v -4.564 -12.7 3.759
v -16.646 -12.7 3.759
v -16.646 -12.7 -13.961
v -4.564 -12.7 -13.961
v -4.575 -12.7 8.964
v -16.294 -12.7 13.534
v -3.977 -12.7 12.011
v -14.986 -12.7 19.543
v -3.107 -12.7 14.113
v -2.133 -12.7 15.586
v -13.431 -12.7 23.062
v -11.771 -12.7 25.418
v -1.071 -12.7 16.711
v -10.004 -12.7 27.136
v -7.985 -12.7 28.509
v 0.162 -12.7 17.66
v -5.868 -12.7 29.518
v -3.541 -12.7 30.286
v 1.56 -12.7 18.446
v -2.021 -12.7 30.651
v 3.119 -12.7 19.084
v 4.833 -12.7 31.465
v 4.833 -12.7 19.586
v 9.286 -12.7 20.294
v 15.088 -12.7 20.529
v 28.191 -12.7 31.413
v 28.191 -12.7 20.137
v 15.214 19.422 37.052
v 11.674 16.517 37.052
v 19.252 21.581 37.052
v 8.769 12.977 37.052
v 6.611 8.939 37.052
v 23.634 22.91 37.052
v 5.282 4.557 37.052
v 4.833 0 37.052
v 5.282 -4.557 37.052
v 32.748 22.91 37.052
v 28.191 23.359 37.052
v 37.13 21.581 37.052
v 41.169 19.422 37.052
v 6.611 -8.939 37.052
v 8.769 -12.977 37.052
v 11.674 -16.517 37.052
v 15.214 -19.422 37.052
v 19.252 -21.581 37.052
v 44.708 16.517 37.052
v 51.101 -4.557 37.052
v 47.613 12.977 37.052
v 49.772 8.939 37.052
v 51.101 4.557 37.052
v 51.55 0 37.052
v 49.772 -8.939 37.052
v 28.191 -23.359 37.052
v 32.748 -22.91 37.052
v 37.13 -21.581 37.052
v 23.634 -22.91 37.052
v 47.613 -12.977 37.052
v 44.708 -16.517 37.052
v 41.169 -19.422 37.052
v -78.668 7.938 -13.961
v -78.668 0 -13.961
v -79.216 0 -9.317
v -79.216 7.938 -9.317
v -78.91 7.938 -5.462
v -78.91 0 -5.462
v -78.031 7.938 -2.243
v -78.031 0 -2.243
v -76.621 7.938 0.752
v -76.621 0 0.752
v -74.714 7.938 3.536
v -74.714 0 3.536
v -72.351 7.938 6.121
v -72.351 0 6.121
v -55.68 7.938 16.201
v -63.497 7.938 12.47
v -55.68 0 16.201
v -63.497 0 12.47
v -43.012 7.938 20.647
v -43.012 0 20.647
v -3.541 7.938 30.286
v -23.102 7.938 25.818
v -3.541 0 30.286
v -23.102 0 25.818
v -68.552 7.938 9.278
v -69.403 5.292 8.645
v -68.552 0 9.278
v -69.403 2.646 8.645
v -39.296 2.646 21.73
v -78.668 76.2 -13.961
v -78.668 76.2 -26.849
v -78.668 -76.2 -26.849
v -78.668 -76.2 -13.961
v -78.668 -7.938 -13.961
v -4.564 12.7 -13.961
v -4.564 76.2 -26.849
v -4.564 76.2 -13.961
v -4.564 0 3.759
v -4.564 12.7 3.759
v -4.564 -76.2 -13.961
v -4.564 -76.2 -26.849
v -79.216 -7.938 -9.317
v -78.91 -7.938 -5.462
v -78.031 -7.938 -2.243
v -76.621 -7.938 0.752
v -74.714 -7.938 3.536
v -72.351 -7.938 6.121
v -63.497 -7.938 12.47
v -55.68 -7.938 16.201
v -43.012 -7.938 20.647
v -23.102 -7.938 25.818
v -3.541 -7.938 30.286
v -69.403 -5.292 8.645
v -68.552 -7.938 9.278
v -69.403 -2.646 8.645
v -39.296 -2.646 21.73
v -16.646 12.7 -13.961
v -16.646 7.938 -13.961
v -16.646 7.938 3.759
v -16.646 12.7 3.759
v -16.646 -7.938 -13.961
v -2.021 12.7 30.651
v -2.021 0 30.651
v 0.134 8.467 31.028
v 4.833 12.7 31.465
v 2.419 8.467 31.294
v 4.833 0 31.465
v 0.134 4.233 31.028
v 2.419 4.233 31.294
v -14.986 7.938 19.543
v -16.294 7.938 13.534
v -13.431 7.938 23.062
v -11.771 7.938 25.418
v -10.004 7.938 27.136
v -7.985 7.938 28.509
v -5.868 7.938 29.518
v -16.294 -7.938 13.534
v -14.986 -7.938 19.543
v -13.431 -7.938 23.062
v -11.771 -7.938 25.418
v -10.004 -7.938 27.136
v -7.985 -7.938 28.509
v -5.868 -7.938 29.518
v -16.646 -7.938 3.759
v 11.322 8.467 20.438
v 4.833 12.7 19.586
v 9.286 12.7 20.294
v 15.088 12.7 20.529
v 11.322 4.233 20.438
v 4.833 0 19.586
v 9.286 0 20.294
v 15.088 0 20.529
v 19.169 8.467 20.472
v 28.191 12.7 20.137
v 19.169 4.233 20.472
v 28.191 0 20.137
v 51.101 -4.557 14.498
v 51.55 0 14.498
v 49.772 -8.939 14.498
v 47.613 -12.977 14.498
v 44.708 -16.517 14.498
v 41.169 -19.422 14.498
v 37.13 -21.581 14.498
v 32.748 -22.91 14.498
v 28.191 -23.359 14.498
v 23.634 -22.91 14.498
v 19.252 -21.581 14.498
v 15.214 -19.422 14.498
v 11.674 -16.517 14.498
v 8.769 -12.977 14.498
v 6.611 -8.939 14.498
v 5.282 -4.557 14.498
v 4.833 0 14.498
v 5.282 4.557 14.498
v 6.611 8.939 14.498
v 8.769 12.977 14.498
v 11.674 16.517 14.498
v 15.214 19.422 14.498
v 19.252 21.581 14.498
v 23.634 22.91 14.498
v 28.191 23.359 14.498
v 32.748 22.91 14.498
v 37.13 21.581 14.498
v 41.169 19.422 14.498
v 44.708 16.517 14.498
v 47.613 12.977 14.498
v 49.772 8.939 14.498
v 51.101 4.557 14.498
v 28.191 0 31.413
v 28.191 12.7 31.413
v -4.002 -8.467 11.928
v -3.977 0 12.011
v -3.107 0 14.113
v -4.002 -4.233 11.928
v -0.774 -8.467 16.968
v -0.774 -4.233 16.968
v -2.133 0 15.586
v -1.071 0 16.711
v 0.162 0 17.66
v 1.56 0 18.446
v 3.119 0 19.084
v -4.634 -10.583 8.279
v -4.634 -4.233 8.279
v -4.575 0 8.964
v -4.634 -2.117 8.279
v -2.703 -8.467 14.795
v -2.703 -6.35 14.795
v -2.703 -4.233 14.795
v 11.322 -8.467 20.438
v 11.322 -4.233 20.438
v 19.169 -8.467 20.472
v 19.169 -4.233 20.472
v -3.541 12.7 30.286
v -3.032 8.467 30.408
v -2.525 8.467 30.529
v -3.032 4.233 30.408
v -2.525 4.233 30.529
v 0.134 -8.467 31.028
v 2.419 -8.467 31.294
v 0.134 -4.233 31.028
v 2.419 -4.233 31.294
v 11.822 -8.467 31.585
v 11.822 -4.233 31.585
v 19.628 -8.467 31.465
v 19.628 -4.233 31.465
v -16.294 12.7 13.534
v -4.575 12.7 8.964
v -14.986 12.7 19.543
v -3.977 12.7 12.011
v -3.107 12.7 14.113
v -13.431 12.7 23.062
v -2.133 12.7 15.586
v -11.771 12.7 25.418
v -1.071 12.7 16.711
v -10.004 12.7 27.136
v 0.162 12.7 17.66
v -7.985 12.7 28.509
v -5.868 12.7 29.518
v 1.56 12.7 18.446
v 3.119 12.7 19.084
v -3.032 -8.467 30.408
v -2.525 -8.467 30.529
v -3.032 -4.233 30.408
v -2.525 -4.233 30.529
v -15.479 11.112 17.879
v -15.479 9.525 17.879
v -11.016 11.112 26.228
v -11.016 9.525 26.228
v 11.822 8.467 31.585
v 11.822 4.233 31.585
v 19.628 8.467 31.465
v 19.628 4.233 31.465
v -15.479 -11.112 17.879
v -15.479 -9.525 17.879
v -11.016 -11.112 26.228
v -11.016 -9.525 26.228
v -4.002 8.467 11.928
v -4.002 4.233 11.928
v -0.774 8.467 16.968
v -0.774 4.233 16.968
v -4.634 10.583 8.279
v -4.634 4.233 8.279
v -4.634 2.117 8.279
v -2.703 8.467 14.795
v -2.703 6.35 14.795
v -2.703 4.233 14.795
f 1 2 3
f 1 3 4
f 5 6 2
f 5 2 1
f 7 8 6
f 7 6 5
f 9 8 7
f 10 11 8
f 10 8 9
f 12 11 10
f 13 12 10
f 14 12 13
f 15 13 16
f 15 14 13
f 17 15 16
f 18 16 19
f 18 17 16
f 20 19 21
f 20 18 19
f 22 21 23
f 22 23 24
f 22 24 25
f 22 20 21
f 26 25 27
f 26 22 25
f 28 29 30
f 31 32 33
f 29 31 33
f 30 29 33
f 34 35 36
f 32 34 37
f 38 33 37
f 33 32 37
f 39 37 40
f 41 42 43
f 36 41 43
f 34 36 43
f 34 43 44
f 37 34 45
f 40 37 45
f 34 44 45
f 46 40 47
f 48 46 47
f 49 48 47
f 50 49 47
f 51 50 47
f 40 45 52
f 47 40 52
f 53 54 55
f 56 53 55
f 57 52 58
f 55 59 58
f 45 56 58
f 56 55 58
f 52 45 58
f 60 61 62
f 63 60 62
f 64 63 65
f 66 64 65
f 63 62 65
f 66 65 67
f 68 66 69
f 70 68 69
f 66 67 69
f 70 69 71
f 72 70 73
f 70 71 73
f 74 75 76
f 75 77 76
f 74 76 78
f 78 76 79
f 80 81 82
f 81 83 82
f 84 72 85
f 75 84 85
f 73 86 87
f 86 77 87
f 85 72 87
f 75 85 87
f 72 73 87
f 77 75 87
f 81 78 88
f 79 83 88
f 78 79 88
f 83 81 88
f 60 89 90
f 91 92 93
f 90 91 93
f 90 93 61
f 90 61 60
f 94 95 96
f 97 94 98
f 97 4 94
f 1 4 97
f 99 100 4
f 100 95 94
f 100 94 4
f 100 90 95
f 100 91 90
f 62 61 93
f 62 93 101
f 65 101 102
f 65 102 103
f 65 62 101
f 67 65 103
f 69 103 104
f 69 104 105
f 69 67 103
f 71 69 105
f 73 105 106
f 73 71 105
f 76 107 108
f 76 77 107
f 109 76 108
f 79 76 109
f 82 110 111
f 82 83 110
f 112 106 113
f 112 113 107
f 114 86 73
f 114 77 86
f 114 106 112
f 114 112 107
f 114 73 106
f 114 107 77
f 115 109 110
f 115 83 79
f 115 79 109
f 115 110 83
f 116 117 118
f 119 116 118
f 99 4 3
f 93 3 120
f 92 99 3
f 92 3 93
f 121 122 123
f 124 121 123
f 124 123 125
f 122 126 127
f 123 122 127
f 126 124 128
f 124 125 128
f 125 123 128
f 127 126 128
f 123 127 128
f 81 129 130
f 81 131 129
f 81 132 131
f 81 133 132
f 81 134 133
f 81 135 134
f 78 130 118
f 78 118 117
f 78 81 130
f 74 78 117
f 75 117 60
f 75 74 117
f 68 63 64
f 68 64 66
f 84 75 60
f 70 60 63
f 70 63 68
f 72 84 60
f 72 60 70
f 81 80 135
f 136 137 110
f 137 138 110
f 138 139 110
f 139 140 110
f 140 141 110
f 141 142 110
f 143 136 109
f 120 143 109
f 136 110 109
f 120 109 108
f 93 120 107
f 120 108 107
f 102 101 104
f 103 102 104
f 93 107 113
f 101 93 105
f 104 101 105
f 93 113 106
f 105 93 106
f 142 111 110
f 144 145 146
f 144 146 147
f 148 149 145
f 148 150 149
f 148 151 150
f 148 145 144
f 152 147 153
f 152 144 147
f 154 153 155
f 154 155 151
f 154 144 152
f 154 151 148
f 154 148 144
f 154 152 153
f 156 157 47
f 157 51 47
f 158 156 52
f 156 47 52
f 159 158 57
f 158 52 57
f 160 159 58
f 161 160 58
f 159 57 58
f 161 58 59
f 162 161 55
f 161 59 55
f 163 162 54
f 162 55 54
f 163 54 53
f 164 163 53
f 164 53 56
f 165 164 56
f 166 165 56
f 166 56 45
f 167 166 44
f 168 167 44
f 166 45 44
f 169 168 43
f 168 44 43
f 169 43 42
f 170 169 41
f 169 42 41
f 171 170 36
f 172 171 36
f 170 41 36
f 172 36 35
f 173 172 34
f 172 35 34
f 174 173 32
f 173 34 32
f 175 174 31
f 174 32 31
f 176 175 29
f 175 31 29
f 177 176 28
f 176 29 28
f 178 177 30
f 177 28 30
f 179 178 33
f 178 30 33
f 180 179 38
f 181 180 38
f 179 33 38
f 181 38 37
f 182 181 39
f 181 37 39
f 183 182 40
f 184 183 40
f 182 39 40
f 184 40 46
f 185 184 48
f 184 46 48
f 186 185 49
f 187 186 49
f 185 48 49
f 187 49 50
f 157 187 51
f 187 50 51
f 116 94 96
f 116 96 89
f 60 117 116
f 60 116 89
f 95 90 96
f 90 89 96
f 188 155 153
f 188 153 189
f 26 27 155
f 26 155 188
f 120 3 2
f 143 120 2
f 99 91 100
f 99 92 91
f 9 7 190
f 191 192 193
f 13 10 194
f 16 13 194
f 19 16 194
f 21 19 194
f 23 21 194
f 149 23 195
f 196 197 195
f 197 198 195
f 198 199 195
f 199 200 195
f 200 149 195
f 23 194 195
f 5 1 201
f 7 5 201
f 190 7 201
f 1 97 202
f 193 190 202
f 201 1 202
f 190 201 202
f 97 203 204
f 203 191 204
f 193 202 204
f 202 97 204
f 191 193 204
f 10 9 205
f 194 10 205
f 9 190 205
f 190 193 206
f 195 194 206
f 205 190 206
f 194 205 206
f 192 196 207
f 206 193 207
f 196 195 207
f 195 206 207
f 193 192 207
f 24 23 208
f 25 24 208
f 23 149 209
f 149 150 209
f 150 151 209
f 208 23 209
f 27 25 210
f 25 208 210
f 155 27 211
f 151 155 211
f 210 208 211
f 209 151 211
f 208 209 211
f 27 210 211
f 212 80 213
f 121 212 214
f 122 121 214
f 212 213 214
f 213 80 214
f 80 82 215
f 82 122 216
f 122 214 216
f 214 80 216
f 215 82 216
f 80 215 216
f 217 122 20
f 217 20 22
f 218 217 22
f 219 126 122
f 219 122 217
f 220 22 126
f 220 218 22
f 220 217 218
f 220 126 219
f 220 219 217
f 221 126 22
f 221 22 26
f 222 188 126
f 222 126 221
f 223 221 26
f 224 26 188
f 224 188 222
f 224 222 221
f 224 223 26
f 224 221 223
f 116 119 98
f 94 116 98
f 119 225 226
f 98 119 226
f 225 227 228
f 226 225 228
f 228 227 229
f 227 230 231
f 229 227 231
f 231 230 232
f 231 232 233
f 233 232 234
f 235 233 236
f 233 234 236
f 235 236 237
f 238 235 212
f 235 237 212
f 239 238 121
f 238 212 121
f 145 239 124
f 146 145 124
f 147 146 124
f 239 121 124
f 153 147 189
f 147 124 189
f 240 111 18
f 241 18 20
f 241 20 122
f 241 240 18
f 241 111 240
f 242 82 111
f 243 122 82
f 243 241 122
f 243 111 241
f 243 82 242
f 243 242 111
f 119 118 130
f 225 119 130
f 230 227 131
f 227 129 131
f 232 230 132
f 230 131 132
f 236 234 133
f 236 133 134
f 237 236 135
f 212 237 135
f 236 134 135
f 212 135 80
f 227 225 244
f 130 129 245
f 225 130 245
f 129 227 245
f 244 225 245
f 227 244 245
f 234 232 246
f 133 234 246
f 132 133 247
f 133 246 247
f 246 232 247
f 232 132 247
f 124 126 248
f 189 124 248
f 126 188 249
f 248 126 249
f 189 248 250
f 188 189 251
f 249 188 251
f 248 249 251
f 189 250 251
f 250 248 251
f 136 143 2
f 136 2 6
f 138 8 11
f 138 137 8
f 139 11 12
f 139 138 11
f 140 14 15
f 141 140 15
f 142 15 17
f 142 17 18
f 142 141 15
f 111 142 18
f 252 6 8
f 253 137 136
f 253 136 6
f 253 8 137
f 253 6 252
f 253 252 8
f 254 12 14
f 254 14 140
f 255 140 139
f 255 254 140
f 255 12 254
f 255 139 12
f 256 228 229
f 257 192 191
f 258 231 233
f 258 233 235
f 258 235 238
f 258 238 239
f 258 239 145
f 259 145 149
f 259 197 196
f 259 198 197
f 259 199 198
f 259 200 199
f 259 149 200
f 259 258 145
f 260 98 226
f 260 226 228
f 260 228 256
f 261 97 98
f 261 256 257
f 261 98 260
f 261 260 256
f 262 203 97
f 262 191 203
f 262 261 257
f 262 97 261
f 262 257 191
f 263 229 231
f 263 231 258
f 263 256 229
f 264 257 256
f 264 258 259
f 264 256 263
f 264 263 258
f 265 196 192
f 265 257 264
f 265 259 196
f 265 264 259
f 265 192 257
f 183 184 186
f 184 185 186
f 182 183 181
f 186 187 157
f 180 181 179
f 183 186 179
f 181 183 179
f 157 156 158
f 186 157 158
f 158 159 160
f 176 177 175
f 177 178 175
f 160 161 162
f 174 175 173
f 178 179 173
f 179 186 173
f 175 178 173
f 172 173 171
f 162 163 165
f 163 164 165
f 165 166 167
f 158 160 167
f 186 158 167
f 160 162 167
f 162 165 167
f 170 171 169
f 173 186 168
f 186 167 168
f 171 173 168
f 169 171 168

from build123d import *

# Parameters (mm, degrees)
F1_DEPTH = 7.9375
F2_DEPTH = 76.2
F0_W     = 12.082048
F0_H     = 17.720336
F3_DEPTH = 12.7


with BuildPart() as f1:
    # F0 (on Front) → F1 (new body, symmetric)
    with BuildSketch(Plane.XZ):
        with BuildLine():
            add(Edge.make_bspline(
                [(-78.667552, -13.961477), (-84.888583, 15.069991), (-37.055626, 22.329717), (-3.541488, 30.286499)],
                knots=[0, 0, 0, 0, 87.547231, 87.547231, 87.547231, 87.547231], degree=3))
            Line((-78.667552, -13.961477), (-16.646377, -13.961477))
            Line((-16.646377, -13.961477), (-16.646377, 3.758859))
            add(Edge.make_bspline(
                [(-16.646377, 3.758859), (-17.220191, 21.260194), (-12.428721, 27.877668), (-3.541488, 30.286499)],
                knots=[0, 0, 0, 0, 28.14689, 28.14689, 28.14689, 28.14689], degree=3))
        make_face()
    extrude(amount=F1_DEPTH, both=True)

    # F0 (on Front) → F2 (join, symmetric)
    with BuildSketch(Plane.XZ):
        Polygon((-78.667552, -26.848992), (-4.564329, -26.848992), (-4.564329, -13.961477), (-16.646377, -13.961477), (-78.667552, -13.961477), align=None)
    extrude(amount=F2_DEPTH, both=True)

    # F0 (on Front) → F3 (join, symmetric)
    with BuildSketch(Plane.XZ):
        with Locations((-10.605353, -5.101309)):
            Rectangle(F0_W, F0_H)
        with BuildLine():
            Line((-16.646377, 3.758859), (-4.564329, 3.758859))
            add(Edge.make_bspline(
                [(-4.564329, 3.758859), (-5.431204, 13.727929), (-1.866506, 17.943729), (4.832817, 19.585869)],
                knots=[0, 0, 0, 0, 19.706993, 19.706993, 19.706993, 19.706993], degree=3))
            Line((4.832817, 19.585869), (4.832817, 31.465202))
            add(Edge.make_bspline(
                [(-2.020811, 30.650517), (0.067241, 31.089042), (2.356514, 31.335734), (4.832817, 31.465202)],
                knots=[29.71238, 29.71238, 29.71238, 29.71238, 36.00564, 36.00564, 36.00564, 36.00564], degree=3))
            add(Edge.make_bspline(
                [(-3.541488, 30.286499), (-3.031195, 30.40765), (-2.524222, 30.528963), (-2.020811, 30.650517)],
                knots=[87.547231, 87.547231, 87.547231, 87.547231, 88.880242, 88.880242, 88.880242, 88.880242], degree=3))
            add(Edge.make_bspline(
                [(-16.646377, 3.758859), (-17.220191, 21.260194), (-12.428721, 27.877668), (-3.541488, 30.286499)],
                knots=[0, 0, 0, 0, 28.14689, 28.14689, 28.14689, 28.14689], degree=3))
        make_face()
        with BuildLine():
            Line((4.832817, 31.465202), (4.832817, 19.585869))
            add(Edge.make_bspline(
                [(4.832817, 19.585869), (10.583037, 20.995365), (18.642622, 20.508776), (28.191444, 20.136743)],
                knots=[19.706993, 19.706993, 19.706993, 19.706993, 36.622066, 36.622066, 36.622066, 36.622066], degree=3))
            Line((28.191444, 20.136743), (28.191444, 31.413321))
            add(Edge.make_bspline(
                [(4.832817, 31.465202), (11.393993, 31.80824), (19.268182, 31.328338), (28.191444, 31.413321)],
                knots=[36.00564, 36.00564, 36.00564, 36.00564, 52.680162, 52.680162, 52.680162, 52.680162], degree=3))
        make_face()
    extrude(amount=F3_DEPTH, both=True)


with BuildPart() as f4:
    # F0 (on Front) → F4 (revolve)
    with BuildSketch(Plane.XZ):
        Polygon((28.191444, 31.413321), (28.191444, 20.136743), (28.191444, 14.498454), (51.55007, 14.498454), (51.55007, 37.051611), (28.191444, 37.051611), align=None)
    revolve(axis=Axis((28.191444, 0, 25.775032), (0, 0, -1)))


solid = Compound([f1.part, f4.part])
